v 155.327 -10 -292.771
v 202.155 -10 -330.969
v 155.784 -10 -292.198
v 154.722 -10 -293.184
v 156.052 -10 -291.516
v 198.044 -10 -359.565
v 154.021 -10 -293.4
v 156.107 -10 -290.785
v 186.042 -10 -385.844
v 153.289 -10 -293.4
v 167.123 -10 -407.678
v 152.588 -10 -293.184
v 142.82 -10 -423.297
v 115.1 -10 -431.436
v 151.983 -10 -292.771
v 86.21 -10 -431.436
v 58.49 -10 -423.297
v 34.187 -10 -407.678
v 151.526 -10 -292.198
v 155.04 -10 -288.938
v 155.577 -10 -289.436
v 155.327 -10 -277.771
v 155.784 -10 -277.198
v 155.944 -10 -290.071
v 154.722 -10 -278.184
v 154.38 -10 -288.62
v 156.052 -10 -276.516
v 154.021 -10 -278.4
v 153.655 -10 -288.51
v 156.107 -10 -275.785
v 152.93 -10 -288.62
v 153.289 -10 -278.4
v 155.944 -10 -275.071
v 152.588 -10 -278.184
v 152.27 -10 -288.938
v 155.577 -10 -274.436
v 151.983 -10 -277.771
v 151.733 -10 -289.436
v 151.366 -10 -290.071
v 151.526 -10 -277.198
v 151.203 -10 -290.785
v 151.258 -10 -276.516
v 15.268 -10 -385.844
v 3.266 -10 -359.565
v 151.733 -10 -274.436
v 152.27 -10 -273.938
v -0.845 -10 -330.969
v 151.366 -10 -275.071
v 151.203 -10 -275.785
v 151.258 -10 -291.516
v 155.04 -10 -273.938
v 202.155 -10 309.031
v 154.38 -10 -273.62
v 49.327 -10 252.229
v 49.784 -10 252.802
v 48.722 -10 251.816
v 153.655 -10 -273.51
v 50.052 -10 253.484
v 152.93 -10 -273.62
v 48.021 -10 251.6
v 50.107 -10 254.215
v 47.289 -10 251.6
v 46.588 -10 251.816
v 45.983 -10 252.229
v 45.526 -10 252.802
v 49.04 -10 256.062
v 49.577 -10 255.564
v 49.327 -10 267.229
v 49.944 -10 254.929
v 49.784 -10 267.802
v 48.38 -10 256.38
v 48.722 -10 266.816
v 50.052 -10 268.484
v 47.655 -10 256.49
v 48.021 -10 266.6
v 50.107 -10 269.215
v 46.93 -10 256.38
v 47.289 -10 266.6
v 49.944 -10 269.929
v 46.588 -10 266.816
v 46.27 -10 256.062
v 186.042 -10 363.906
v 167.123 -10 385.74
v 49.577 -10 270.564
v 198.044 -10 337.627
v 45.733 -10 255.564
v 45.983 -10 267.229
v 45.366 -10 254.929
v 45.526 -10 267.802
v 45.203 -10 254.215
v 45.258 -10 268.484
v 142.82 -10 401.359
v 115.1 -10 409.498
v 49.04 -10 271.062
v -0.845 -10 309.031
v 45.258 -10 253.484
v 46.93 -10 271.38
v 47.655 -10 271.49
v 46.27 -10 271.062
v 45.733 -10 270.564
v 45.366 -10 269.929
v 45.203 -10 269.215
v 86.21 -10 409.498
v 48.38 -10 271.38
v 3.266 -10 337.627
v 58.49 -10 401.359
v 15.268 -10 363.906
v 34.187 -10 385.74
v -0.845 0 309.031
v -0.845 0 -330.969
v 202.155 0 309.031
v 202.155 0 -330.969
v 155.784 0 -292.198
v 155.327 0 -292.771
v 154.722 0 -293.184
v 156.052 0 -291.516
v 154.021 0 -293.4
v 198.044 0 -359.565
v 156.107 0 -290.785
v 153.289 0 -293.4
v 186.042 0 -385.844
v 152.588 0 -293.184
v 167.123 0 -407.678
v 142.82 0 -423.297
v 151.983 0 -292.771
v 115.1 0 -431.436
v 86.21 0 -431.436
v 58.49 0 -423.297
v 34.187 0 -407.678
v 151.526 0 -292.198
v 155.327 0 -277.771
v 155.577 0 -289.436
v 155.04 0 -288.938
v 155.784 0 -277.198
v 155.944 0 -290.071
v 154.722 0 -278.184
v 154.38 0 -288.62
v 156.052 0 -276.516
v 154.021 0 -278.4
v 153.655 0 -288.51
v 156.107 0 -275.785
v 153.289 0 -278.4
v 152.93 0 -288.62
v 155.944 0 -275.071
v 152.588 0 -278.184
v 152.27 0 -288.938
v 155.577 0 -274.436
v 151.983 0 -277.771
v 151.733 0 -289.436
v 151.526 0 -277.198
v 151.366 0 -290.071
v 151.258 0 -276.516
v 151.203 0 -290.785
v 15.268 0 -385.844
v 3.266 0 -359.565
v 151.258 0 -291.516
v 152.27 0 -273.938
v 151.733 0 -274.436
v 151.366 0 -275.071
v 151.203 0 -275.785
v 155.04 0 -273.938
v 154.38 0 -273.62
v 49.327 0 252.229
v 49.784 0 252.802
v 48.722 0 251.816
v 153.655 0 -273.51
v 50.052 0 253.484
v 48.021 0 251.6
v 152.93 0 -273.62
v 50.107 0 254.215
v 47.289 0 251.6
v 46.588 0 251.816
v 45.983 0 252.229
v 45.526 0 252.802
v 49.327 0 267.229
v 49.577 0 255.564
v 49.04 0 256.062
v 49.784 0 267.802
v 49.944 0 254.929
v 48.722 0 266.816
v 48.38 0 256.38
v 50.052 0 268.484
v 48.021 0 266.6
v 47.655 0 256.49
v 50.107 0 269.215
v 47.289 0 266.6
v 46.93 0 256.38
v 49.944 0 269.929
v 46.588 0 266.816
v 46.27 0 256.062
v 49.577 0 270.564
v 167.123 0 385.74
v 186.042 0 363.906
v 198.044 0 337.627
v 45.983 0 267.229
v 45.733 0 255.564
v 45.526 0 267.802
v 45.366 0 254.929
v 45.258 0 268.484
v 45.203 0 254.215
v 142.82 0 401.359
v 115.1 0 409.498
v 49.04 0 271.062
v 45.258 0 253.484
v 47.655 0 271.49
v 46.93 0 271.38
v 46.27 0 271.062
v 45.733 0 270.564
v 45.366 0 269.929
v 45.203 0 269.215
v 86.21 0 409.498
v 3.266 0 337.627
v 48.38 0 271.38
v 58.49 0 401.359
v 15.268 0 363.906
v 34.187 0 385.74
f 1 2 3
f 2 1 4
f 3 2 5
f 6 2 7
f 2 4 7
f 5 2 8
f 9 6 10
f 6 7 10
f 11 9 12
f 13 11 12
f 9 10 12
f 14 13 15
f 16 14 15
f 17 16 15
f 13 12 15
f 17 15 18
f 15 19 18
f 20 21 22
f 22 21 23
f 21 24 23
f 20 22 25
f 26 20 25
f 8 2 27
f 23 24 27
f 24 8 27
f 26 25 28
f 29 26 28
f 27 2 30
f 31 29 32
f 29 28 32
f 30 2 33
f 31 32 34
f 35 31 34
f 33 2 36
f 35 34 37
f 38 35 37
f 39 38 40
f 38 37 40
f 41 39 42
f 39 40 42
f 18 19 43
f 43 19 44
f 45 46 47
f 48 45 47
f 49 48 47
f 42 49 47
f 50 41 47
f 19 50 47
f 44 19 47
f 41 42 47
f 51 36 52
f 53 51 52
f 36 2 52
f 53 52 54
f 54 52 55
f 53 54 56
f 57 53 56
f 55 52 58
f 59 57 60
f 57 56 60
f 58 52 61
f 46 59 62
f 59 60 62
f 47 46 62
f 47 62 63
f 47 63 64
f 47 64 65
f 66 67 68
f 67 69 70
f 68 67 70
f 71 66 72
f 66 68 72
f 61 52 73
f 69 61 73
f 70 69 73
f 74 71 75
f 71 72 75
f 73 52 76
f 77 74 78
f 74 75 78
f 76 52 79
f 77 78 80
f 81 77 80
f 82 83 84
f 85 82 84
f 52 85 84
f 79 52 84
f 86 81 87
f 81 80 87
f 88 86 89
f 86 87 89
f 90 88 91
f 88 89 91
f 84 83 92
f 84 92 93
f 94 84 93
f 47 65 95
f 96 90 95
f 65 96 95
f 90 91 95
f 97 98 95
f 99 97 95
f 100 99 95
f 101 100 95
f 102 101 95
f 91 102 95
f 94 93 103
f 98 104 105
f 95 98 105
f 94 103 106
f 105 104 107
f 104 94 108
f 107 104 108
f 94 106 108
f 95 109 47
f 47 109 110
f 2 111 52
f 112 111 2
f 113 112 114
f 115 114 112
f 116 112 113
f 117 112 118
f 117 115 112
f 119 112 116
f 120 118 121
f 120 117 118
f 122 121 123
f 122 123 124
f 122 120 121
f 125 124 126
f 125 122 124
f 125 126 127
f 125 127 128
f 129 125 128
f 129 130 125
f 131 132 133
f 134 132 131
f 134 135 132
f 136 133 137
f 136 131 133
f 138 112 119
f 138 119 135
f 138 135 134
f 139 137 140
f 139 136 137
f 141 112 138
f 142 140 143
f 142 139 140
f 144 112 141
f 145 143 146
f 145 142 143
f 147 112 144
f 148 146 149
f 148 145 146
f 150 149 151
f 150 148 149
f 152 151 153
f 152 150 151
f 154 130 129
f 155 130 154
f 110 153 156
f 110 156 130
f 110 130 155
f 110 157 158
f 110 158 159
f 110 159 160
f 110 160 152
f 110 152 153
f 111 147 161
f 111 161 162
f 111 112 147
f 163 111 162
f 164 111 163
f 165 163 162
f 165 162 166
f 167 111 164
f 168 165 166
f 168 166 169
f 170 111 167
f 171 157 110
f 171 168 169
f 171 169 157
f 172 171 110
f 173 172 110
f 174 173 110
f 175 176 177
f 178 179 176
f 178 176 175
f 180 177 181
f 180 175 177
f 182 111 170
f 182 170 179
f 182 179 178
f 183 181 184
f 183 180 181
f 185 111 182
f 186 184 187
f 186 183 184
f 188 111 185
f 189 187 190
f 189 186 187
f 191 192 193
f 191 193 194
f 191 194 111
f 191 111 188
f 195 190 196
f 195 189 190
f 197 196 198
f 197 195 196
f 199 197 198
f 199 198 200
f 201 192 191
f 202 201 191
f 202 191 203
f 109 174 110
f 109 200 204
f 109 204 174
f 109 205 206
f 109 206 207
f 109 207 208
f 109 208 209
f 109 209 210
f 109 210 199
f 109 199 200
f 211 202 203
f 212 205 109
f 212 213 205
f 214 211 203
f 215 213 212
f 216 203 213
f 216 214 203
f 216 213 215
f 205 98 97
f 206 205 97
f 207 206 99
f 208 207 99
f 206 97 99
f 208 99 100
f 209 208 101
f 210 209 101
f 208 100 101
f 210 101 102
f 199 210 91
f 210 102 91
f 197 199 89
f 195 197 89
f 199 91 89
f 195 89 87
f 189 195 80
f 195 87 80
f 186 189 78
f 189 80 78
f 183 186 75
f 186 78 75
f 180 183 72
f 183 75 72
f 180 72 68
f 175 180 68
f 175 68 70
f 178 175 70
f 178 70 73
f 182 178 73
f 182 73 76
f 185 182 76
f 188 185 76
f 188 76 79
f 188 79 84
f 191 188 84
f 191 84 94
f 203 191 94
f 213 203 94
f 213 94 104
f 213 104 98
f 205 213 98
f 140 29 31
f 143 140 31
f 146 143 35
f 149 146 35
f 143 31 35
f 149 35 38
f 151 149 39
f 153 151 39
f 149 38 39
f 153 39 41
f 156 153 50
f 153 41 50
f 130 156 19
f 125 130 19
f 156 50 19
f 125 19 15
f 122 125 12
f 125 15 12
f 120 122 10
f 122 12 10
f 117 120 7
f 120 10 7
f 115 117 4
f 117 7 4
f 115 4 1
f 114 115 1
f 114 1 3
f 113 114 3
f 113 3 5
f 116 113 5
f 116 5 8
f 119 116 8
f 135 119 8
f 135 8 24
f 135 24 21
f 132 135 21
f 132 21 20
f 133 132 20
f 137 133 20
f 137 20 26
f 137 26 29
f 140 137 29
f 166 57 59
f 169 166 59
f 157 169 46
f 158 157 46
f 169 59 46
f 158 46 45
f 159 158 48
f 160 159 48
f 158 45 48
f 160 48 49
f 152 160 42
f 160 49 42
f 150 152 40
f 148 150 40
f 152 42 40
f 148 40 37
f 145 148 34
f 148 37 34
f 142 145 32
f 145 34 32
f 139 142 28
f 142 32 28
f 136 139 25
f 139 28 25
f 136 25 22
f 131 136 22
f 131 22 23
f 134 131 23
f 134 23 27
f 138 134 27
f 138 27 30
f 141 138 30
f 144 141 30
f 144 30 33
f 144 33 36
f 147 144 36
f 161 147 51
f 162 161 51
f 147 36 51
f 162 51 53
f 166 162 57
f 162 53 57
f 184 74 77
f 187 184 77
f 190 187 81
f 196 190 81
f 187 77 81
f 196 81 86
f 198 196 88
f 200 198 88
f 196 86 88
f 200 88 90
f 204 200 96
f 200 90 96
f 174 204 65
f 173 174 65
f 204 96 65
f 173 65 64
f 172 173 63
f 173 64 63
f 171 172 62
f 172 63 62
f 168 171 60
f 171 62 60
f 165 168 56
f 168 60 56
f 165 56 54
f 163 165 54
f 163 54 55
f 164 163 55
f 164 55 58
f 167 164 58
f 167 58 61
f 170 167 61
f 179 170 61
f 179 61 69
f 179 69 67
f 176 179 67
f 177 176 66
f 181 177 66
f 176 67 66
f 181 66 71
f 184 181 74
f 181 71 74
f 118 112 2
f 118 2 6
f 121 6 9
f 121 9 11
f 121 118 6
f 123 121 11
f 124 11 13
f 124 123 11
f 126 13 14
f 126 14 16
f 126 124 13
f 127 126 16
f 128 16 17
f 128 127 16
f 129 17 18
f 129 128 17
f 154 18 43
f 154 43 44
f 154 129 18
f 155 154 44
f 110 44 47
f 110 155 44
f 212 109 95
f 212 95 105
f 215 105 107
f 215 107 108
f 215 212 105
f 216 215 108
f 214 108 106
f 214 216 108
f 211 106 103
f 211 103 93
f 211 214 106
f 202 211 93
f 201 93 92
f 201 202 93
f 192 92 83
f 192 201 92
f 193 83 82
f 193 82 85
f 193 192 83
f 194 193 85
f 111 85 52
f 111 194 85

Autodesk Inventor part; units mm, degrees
ref_plane "YZ Plane" through (0, 0, 0) normal (1, 0, 0) x (0, 1, 0)
ref_plane "XZ Plane" through (0, 0, 0) normal (0, 1, 0) x (-1, 0, 0)
ref_plane "XY Plane" through (0, 0, 0) normal (0, 0, 1) x (1, 0, 0)
sketch "スケッチ1" plane through (0, 0, 0) normal (0, 1, 0) x (-1, 0, 0)
  point P0 (0, 0)
sketch "スケッチ2" plane through (0, 0, 0) normal (0, 1, 0) x (-1, 0, 0)
  line L0 (0.845, -60.969) -> (0.845, -330.969)
  line L1 (0, 0) -> (0, -1.5537)
  line L2 (-202.155, -60.969) -> (-202.155, -330.969)
  arc A0 (-202.155, -330.969) -> (0.845, -330.969) centre (-100.655, -330.969) ccw
  line L3 (0.845, -60.969) -> (0.845, 309.031)
  line L4 (-202.155, -60.969) -> (-202.155, 309.031)
  arc A1 (0.845, 309.031) -> (-202.155, 309.031) centre (-100.655, 309.031) ccw
  circle A2 centre (-47.655, 289.031) radius 6
  circle A3 centre (-47.655, 274.031) radius 6
  circle A4 centre (-153.655, -310.969) radius 6
  circle A5 centre (-153.655, -295.969) radius 6
  dimension "d0" = 270
  dimension "d1" = 203
  dimension "d38" = 12
  dimension "d39" = 20
  dimension "d40" = 12
  dimension "d41" = 15
  dimension "d42" = 48.5
  dimension "d43" = 48.5
  dimension "d44" = 12
  dimension "d45" = 12
  dimension "d46" = 20
  dimension "d47" = 15
  dimension "d48" = 48.5
  dimension "d49" = 48.5
extrude "押し出し1" add sketch "スケッチ2" against normal blind 10 contours L0 A0 L2 L4 A1 L3 | A2 | A3 | A4 | A5
sketch "スケッチ6" plane through (0, 0, 0) normal (0, 1, 0) x (1, 0, 0)
  circle A0 centre (153.655, 290.969) radius 6
  circle A1 centre (153.655, 275.969) radius 6
  arc A2 (202.155, 330.969) -> (-0.845, 330.969) centre (100.655, 330.969) ccw projected
  line L0 (202.155, 330.969) -> (202.155, -309.031) projected
  point P0 (0, 0)
  dimension "d50" = 12
  dimension "d51" = 12
  dimension "d52" = 40
  dimension "d53" = 48.5
  dimension "d54" = 48.5
  dimension "d55" = 15
hole "穴4" at (153.655, 0, -290.969) at (153.655, 0, -275.969) direction (0, -1, 0) diameter 4.917 end through all thread size "M6x1" class "6H" standard "ANSI Metric M Profile"
sketch "スケッチ7" plane through (0, 0, 0) normal (0, 1, 0) x (1, 0, 0)
  circle A0 centre (47.655, -269.031) radius 6
  circle A1 centre (47.655, -254.031) radius 6
  line L0 (-0.845, -309.031) -> (-0.845, 330.969) projected
  arc A2 (-0.845, -309.031) -> (202.155, -309.031) centre (100.655, -309.031) ccw projected
  point P0 (0, 0)
  dimension "d63" = 12
  dimension "d64" = 12
  dimension "d65" = 48.5
  dimension "d66" = 48.5
  dimension "d67" = 40
  dimension "d68" = 15
hole "穴5" at (47.655, 0, 254.031) at (47.655, 0, 269.031) direction (0, -1, 0) diameter 4.917 end through all thread size "M6x1" class "6H" standard "ANSI Metric M Profile"
properties part number "sfp_smartboard_upper_deck" material "合板、仕上げ"
